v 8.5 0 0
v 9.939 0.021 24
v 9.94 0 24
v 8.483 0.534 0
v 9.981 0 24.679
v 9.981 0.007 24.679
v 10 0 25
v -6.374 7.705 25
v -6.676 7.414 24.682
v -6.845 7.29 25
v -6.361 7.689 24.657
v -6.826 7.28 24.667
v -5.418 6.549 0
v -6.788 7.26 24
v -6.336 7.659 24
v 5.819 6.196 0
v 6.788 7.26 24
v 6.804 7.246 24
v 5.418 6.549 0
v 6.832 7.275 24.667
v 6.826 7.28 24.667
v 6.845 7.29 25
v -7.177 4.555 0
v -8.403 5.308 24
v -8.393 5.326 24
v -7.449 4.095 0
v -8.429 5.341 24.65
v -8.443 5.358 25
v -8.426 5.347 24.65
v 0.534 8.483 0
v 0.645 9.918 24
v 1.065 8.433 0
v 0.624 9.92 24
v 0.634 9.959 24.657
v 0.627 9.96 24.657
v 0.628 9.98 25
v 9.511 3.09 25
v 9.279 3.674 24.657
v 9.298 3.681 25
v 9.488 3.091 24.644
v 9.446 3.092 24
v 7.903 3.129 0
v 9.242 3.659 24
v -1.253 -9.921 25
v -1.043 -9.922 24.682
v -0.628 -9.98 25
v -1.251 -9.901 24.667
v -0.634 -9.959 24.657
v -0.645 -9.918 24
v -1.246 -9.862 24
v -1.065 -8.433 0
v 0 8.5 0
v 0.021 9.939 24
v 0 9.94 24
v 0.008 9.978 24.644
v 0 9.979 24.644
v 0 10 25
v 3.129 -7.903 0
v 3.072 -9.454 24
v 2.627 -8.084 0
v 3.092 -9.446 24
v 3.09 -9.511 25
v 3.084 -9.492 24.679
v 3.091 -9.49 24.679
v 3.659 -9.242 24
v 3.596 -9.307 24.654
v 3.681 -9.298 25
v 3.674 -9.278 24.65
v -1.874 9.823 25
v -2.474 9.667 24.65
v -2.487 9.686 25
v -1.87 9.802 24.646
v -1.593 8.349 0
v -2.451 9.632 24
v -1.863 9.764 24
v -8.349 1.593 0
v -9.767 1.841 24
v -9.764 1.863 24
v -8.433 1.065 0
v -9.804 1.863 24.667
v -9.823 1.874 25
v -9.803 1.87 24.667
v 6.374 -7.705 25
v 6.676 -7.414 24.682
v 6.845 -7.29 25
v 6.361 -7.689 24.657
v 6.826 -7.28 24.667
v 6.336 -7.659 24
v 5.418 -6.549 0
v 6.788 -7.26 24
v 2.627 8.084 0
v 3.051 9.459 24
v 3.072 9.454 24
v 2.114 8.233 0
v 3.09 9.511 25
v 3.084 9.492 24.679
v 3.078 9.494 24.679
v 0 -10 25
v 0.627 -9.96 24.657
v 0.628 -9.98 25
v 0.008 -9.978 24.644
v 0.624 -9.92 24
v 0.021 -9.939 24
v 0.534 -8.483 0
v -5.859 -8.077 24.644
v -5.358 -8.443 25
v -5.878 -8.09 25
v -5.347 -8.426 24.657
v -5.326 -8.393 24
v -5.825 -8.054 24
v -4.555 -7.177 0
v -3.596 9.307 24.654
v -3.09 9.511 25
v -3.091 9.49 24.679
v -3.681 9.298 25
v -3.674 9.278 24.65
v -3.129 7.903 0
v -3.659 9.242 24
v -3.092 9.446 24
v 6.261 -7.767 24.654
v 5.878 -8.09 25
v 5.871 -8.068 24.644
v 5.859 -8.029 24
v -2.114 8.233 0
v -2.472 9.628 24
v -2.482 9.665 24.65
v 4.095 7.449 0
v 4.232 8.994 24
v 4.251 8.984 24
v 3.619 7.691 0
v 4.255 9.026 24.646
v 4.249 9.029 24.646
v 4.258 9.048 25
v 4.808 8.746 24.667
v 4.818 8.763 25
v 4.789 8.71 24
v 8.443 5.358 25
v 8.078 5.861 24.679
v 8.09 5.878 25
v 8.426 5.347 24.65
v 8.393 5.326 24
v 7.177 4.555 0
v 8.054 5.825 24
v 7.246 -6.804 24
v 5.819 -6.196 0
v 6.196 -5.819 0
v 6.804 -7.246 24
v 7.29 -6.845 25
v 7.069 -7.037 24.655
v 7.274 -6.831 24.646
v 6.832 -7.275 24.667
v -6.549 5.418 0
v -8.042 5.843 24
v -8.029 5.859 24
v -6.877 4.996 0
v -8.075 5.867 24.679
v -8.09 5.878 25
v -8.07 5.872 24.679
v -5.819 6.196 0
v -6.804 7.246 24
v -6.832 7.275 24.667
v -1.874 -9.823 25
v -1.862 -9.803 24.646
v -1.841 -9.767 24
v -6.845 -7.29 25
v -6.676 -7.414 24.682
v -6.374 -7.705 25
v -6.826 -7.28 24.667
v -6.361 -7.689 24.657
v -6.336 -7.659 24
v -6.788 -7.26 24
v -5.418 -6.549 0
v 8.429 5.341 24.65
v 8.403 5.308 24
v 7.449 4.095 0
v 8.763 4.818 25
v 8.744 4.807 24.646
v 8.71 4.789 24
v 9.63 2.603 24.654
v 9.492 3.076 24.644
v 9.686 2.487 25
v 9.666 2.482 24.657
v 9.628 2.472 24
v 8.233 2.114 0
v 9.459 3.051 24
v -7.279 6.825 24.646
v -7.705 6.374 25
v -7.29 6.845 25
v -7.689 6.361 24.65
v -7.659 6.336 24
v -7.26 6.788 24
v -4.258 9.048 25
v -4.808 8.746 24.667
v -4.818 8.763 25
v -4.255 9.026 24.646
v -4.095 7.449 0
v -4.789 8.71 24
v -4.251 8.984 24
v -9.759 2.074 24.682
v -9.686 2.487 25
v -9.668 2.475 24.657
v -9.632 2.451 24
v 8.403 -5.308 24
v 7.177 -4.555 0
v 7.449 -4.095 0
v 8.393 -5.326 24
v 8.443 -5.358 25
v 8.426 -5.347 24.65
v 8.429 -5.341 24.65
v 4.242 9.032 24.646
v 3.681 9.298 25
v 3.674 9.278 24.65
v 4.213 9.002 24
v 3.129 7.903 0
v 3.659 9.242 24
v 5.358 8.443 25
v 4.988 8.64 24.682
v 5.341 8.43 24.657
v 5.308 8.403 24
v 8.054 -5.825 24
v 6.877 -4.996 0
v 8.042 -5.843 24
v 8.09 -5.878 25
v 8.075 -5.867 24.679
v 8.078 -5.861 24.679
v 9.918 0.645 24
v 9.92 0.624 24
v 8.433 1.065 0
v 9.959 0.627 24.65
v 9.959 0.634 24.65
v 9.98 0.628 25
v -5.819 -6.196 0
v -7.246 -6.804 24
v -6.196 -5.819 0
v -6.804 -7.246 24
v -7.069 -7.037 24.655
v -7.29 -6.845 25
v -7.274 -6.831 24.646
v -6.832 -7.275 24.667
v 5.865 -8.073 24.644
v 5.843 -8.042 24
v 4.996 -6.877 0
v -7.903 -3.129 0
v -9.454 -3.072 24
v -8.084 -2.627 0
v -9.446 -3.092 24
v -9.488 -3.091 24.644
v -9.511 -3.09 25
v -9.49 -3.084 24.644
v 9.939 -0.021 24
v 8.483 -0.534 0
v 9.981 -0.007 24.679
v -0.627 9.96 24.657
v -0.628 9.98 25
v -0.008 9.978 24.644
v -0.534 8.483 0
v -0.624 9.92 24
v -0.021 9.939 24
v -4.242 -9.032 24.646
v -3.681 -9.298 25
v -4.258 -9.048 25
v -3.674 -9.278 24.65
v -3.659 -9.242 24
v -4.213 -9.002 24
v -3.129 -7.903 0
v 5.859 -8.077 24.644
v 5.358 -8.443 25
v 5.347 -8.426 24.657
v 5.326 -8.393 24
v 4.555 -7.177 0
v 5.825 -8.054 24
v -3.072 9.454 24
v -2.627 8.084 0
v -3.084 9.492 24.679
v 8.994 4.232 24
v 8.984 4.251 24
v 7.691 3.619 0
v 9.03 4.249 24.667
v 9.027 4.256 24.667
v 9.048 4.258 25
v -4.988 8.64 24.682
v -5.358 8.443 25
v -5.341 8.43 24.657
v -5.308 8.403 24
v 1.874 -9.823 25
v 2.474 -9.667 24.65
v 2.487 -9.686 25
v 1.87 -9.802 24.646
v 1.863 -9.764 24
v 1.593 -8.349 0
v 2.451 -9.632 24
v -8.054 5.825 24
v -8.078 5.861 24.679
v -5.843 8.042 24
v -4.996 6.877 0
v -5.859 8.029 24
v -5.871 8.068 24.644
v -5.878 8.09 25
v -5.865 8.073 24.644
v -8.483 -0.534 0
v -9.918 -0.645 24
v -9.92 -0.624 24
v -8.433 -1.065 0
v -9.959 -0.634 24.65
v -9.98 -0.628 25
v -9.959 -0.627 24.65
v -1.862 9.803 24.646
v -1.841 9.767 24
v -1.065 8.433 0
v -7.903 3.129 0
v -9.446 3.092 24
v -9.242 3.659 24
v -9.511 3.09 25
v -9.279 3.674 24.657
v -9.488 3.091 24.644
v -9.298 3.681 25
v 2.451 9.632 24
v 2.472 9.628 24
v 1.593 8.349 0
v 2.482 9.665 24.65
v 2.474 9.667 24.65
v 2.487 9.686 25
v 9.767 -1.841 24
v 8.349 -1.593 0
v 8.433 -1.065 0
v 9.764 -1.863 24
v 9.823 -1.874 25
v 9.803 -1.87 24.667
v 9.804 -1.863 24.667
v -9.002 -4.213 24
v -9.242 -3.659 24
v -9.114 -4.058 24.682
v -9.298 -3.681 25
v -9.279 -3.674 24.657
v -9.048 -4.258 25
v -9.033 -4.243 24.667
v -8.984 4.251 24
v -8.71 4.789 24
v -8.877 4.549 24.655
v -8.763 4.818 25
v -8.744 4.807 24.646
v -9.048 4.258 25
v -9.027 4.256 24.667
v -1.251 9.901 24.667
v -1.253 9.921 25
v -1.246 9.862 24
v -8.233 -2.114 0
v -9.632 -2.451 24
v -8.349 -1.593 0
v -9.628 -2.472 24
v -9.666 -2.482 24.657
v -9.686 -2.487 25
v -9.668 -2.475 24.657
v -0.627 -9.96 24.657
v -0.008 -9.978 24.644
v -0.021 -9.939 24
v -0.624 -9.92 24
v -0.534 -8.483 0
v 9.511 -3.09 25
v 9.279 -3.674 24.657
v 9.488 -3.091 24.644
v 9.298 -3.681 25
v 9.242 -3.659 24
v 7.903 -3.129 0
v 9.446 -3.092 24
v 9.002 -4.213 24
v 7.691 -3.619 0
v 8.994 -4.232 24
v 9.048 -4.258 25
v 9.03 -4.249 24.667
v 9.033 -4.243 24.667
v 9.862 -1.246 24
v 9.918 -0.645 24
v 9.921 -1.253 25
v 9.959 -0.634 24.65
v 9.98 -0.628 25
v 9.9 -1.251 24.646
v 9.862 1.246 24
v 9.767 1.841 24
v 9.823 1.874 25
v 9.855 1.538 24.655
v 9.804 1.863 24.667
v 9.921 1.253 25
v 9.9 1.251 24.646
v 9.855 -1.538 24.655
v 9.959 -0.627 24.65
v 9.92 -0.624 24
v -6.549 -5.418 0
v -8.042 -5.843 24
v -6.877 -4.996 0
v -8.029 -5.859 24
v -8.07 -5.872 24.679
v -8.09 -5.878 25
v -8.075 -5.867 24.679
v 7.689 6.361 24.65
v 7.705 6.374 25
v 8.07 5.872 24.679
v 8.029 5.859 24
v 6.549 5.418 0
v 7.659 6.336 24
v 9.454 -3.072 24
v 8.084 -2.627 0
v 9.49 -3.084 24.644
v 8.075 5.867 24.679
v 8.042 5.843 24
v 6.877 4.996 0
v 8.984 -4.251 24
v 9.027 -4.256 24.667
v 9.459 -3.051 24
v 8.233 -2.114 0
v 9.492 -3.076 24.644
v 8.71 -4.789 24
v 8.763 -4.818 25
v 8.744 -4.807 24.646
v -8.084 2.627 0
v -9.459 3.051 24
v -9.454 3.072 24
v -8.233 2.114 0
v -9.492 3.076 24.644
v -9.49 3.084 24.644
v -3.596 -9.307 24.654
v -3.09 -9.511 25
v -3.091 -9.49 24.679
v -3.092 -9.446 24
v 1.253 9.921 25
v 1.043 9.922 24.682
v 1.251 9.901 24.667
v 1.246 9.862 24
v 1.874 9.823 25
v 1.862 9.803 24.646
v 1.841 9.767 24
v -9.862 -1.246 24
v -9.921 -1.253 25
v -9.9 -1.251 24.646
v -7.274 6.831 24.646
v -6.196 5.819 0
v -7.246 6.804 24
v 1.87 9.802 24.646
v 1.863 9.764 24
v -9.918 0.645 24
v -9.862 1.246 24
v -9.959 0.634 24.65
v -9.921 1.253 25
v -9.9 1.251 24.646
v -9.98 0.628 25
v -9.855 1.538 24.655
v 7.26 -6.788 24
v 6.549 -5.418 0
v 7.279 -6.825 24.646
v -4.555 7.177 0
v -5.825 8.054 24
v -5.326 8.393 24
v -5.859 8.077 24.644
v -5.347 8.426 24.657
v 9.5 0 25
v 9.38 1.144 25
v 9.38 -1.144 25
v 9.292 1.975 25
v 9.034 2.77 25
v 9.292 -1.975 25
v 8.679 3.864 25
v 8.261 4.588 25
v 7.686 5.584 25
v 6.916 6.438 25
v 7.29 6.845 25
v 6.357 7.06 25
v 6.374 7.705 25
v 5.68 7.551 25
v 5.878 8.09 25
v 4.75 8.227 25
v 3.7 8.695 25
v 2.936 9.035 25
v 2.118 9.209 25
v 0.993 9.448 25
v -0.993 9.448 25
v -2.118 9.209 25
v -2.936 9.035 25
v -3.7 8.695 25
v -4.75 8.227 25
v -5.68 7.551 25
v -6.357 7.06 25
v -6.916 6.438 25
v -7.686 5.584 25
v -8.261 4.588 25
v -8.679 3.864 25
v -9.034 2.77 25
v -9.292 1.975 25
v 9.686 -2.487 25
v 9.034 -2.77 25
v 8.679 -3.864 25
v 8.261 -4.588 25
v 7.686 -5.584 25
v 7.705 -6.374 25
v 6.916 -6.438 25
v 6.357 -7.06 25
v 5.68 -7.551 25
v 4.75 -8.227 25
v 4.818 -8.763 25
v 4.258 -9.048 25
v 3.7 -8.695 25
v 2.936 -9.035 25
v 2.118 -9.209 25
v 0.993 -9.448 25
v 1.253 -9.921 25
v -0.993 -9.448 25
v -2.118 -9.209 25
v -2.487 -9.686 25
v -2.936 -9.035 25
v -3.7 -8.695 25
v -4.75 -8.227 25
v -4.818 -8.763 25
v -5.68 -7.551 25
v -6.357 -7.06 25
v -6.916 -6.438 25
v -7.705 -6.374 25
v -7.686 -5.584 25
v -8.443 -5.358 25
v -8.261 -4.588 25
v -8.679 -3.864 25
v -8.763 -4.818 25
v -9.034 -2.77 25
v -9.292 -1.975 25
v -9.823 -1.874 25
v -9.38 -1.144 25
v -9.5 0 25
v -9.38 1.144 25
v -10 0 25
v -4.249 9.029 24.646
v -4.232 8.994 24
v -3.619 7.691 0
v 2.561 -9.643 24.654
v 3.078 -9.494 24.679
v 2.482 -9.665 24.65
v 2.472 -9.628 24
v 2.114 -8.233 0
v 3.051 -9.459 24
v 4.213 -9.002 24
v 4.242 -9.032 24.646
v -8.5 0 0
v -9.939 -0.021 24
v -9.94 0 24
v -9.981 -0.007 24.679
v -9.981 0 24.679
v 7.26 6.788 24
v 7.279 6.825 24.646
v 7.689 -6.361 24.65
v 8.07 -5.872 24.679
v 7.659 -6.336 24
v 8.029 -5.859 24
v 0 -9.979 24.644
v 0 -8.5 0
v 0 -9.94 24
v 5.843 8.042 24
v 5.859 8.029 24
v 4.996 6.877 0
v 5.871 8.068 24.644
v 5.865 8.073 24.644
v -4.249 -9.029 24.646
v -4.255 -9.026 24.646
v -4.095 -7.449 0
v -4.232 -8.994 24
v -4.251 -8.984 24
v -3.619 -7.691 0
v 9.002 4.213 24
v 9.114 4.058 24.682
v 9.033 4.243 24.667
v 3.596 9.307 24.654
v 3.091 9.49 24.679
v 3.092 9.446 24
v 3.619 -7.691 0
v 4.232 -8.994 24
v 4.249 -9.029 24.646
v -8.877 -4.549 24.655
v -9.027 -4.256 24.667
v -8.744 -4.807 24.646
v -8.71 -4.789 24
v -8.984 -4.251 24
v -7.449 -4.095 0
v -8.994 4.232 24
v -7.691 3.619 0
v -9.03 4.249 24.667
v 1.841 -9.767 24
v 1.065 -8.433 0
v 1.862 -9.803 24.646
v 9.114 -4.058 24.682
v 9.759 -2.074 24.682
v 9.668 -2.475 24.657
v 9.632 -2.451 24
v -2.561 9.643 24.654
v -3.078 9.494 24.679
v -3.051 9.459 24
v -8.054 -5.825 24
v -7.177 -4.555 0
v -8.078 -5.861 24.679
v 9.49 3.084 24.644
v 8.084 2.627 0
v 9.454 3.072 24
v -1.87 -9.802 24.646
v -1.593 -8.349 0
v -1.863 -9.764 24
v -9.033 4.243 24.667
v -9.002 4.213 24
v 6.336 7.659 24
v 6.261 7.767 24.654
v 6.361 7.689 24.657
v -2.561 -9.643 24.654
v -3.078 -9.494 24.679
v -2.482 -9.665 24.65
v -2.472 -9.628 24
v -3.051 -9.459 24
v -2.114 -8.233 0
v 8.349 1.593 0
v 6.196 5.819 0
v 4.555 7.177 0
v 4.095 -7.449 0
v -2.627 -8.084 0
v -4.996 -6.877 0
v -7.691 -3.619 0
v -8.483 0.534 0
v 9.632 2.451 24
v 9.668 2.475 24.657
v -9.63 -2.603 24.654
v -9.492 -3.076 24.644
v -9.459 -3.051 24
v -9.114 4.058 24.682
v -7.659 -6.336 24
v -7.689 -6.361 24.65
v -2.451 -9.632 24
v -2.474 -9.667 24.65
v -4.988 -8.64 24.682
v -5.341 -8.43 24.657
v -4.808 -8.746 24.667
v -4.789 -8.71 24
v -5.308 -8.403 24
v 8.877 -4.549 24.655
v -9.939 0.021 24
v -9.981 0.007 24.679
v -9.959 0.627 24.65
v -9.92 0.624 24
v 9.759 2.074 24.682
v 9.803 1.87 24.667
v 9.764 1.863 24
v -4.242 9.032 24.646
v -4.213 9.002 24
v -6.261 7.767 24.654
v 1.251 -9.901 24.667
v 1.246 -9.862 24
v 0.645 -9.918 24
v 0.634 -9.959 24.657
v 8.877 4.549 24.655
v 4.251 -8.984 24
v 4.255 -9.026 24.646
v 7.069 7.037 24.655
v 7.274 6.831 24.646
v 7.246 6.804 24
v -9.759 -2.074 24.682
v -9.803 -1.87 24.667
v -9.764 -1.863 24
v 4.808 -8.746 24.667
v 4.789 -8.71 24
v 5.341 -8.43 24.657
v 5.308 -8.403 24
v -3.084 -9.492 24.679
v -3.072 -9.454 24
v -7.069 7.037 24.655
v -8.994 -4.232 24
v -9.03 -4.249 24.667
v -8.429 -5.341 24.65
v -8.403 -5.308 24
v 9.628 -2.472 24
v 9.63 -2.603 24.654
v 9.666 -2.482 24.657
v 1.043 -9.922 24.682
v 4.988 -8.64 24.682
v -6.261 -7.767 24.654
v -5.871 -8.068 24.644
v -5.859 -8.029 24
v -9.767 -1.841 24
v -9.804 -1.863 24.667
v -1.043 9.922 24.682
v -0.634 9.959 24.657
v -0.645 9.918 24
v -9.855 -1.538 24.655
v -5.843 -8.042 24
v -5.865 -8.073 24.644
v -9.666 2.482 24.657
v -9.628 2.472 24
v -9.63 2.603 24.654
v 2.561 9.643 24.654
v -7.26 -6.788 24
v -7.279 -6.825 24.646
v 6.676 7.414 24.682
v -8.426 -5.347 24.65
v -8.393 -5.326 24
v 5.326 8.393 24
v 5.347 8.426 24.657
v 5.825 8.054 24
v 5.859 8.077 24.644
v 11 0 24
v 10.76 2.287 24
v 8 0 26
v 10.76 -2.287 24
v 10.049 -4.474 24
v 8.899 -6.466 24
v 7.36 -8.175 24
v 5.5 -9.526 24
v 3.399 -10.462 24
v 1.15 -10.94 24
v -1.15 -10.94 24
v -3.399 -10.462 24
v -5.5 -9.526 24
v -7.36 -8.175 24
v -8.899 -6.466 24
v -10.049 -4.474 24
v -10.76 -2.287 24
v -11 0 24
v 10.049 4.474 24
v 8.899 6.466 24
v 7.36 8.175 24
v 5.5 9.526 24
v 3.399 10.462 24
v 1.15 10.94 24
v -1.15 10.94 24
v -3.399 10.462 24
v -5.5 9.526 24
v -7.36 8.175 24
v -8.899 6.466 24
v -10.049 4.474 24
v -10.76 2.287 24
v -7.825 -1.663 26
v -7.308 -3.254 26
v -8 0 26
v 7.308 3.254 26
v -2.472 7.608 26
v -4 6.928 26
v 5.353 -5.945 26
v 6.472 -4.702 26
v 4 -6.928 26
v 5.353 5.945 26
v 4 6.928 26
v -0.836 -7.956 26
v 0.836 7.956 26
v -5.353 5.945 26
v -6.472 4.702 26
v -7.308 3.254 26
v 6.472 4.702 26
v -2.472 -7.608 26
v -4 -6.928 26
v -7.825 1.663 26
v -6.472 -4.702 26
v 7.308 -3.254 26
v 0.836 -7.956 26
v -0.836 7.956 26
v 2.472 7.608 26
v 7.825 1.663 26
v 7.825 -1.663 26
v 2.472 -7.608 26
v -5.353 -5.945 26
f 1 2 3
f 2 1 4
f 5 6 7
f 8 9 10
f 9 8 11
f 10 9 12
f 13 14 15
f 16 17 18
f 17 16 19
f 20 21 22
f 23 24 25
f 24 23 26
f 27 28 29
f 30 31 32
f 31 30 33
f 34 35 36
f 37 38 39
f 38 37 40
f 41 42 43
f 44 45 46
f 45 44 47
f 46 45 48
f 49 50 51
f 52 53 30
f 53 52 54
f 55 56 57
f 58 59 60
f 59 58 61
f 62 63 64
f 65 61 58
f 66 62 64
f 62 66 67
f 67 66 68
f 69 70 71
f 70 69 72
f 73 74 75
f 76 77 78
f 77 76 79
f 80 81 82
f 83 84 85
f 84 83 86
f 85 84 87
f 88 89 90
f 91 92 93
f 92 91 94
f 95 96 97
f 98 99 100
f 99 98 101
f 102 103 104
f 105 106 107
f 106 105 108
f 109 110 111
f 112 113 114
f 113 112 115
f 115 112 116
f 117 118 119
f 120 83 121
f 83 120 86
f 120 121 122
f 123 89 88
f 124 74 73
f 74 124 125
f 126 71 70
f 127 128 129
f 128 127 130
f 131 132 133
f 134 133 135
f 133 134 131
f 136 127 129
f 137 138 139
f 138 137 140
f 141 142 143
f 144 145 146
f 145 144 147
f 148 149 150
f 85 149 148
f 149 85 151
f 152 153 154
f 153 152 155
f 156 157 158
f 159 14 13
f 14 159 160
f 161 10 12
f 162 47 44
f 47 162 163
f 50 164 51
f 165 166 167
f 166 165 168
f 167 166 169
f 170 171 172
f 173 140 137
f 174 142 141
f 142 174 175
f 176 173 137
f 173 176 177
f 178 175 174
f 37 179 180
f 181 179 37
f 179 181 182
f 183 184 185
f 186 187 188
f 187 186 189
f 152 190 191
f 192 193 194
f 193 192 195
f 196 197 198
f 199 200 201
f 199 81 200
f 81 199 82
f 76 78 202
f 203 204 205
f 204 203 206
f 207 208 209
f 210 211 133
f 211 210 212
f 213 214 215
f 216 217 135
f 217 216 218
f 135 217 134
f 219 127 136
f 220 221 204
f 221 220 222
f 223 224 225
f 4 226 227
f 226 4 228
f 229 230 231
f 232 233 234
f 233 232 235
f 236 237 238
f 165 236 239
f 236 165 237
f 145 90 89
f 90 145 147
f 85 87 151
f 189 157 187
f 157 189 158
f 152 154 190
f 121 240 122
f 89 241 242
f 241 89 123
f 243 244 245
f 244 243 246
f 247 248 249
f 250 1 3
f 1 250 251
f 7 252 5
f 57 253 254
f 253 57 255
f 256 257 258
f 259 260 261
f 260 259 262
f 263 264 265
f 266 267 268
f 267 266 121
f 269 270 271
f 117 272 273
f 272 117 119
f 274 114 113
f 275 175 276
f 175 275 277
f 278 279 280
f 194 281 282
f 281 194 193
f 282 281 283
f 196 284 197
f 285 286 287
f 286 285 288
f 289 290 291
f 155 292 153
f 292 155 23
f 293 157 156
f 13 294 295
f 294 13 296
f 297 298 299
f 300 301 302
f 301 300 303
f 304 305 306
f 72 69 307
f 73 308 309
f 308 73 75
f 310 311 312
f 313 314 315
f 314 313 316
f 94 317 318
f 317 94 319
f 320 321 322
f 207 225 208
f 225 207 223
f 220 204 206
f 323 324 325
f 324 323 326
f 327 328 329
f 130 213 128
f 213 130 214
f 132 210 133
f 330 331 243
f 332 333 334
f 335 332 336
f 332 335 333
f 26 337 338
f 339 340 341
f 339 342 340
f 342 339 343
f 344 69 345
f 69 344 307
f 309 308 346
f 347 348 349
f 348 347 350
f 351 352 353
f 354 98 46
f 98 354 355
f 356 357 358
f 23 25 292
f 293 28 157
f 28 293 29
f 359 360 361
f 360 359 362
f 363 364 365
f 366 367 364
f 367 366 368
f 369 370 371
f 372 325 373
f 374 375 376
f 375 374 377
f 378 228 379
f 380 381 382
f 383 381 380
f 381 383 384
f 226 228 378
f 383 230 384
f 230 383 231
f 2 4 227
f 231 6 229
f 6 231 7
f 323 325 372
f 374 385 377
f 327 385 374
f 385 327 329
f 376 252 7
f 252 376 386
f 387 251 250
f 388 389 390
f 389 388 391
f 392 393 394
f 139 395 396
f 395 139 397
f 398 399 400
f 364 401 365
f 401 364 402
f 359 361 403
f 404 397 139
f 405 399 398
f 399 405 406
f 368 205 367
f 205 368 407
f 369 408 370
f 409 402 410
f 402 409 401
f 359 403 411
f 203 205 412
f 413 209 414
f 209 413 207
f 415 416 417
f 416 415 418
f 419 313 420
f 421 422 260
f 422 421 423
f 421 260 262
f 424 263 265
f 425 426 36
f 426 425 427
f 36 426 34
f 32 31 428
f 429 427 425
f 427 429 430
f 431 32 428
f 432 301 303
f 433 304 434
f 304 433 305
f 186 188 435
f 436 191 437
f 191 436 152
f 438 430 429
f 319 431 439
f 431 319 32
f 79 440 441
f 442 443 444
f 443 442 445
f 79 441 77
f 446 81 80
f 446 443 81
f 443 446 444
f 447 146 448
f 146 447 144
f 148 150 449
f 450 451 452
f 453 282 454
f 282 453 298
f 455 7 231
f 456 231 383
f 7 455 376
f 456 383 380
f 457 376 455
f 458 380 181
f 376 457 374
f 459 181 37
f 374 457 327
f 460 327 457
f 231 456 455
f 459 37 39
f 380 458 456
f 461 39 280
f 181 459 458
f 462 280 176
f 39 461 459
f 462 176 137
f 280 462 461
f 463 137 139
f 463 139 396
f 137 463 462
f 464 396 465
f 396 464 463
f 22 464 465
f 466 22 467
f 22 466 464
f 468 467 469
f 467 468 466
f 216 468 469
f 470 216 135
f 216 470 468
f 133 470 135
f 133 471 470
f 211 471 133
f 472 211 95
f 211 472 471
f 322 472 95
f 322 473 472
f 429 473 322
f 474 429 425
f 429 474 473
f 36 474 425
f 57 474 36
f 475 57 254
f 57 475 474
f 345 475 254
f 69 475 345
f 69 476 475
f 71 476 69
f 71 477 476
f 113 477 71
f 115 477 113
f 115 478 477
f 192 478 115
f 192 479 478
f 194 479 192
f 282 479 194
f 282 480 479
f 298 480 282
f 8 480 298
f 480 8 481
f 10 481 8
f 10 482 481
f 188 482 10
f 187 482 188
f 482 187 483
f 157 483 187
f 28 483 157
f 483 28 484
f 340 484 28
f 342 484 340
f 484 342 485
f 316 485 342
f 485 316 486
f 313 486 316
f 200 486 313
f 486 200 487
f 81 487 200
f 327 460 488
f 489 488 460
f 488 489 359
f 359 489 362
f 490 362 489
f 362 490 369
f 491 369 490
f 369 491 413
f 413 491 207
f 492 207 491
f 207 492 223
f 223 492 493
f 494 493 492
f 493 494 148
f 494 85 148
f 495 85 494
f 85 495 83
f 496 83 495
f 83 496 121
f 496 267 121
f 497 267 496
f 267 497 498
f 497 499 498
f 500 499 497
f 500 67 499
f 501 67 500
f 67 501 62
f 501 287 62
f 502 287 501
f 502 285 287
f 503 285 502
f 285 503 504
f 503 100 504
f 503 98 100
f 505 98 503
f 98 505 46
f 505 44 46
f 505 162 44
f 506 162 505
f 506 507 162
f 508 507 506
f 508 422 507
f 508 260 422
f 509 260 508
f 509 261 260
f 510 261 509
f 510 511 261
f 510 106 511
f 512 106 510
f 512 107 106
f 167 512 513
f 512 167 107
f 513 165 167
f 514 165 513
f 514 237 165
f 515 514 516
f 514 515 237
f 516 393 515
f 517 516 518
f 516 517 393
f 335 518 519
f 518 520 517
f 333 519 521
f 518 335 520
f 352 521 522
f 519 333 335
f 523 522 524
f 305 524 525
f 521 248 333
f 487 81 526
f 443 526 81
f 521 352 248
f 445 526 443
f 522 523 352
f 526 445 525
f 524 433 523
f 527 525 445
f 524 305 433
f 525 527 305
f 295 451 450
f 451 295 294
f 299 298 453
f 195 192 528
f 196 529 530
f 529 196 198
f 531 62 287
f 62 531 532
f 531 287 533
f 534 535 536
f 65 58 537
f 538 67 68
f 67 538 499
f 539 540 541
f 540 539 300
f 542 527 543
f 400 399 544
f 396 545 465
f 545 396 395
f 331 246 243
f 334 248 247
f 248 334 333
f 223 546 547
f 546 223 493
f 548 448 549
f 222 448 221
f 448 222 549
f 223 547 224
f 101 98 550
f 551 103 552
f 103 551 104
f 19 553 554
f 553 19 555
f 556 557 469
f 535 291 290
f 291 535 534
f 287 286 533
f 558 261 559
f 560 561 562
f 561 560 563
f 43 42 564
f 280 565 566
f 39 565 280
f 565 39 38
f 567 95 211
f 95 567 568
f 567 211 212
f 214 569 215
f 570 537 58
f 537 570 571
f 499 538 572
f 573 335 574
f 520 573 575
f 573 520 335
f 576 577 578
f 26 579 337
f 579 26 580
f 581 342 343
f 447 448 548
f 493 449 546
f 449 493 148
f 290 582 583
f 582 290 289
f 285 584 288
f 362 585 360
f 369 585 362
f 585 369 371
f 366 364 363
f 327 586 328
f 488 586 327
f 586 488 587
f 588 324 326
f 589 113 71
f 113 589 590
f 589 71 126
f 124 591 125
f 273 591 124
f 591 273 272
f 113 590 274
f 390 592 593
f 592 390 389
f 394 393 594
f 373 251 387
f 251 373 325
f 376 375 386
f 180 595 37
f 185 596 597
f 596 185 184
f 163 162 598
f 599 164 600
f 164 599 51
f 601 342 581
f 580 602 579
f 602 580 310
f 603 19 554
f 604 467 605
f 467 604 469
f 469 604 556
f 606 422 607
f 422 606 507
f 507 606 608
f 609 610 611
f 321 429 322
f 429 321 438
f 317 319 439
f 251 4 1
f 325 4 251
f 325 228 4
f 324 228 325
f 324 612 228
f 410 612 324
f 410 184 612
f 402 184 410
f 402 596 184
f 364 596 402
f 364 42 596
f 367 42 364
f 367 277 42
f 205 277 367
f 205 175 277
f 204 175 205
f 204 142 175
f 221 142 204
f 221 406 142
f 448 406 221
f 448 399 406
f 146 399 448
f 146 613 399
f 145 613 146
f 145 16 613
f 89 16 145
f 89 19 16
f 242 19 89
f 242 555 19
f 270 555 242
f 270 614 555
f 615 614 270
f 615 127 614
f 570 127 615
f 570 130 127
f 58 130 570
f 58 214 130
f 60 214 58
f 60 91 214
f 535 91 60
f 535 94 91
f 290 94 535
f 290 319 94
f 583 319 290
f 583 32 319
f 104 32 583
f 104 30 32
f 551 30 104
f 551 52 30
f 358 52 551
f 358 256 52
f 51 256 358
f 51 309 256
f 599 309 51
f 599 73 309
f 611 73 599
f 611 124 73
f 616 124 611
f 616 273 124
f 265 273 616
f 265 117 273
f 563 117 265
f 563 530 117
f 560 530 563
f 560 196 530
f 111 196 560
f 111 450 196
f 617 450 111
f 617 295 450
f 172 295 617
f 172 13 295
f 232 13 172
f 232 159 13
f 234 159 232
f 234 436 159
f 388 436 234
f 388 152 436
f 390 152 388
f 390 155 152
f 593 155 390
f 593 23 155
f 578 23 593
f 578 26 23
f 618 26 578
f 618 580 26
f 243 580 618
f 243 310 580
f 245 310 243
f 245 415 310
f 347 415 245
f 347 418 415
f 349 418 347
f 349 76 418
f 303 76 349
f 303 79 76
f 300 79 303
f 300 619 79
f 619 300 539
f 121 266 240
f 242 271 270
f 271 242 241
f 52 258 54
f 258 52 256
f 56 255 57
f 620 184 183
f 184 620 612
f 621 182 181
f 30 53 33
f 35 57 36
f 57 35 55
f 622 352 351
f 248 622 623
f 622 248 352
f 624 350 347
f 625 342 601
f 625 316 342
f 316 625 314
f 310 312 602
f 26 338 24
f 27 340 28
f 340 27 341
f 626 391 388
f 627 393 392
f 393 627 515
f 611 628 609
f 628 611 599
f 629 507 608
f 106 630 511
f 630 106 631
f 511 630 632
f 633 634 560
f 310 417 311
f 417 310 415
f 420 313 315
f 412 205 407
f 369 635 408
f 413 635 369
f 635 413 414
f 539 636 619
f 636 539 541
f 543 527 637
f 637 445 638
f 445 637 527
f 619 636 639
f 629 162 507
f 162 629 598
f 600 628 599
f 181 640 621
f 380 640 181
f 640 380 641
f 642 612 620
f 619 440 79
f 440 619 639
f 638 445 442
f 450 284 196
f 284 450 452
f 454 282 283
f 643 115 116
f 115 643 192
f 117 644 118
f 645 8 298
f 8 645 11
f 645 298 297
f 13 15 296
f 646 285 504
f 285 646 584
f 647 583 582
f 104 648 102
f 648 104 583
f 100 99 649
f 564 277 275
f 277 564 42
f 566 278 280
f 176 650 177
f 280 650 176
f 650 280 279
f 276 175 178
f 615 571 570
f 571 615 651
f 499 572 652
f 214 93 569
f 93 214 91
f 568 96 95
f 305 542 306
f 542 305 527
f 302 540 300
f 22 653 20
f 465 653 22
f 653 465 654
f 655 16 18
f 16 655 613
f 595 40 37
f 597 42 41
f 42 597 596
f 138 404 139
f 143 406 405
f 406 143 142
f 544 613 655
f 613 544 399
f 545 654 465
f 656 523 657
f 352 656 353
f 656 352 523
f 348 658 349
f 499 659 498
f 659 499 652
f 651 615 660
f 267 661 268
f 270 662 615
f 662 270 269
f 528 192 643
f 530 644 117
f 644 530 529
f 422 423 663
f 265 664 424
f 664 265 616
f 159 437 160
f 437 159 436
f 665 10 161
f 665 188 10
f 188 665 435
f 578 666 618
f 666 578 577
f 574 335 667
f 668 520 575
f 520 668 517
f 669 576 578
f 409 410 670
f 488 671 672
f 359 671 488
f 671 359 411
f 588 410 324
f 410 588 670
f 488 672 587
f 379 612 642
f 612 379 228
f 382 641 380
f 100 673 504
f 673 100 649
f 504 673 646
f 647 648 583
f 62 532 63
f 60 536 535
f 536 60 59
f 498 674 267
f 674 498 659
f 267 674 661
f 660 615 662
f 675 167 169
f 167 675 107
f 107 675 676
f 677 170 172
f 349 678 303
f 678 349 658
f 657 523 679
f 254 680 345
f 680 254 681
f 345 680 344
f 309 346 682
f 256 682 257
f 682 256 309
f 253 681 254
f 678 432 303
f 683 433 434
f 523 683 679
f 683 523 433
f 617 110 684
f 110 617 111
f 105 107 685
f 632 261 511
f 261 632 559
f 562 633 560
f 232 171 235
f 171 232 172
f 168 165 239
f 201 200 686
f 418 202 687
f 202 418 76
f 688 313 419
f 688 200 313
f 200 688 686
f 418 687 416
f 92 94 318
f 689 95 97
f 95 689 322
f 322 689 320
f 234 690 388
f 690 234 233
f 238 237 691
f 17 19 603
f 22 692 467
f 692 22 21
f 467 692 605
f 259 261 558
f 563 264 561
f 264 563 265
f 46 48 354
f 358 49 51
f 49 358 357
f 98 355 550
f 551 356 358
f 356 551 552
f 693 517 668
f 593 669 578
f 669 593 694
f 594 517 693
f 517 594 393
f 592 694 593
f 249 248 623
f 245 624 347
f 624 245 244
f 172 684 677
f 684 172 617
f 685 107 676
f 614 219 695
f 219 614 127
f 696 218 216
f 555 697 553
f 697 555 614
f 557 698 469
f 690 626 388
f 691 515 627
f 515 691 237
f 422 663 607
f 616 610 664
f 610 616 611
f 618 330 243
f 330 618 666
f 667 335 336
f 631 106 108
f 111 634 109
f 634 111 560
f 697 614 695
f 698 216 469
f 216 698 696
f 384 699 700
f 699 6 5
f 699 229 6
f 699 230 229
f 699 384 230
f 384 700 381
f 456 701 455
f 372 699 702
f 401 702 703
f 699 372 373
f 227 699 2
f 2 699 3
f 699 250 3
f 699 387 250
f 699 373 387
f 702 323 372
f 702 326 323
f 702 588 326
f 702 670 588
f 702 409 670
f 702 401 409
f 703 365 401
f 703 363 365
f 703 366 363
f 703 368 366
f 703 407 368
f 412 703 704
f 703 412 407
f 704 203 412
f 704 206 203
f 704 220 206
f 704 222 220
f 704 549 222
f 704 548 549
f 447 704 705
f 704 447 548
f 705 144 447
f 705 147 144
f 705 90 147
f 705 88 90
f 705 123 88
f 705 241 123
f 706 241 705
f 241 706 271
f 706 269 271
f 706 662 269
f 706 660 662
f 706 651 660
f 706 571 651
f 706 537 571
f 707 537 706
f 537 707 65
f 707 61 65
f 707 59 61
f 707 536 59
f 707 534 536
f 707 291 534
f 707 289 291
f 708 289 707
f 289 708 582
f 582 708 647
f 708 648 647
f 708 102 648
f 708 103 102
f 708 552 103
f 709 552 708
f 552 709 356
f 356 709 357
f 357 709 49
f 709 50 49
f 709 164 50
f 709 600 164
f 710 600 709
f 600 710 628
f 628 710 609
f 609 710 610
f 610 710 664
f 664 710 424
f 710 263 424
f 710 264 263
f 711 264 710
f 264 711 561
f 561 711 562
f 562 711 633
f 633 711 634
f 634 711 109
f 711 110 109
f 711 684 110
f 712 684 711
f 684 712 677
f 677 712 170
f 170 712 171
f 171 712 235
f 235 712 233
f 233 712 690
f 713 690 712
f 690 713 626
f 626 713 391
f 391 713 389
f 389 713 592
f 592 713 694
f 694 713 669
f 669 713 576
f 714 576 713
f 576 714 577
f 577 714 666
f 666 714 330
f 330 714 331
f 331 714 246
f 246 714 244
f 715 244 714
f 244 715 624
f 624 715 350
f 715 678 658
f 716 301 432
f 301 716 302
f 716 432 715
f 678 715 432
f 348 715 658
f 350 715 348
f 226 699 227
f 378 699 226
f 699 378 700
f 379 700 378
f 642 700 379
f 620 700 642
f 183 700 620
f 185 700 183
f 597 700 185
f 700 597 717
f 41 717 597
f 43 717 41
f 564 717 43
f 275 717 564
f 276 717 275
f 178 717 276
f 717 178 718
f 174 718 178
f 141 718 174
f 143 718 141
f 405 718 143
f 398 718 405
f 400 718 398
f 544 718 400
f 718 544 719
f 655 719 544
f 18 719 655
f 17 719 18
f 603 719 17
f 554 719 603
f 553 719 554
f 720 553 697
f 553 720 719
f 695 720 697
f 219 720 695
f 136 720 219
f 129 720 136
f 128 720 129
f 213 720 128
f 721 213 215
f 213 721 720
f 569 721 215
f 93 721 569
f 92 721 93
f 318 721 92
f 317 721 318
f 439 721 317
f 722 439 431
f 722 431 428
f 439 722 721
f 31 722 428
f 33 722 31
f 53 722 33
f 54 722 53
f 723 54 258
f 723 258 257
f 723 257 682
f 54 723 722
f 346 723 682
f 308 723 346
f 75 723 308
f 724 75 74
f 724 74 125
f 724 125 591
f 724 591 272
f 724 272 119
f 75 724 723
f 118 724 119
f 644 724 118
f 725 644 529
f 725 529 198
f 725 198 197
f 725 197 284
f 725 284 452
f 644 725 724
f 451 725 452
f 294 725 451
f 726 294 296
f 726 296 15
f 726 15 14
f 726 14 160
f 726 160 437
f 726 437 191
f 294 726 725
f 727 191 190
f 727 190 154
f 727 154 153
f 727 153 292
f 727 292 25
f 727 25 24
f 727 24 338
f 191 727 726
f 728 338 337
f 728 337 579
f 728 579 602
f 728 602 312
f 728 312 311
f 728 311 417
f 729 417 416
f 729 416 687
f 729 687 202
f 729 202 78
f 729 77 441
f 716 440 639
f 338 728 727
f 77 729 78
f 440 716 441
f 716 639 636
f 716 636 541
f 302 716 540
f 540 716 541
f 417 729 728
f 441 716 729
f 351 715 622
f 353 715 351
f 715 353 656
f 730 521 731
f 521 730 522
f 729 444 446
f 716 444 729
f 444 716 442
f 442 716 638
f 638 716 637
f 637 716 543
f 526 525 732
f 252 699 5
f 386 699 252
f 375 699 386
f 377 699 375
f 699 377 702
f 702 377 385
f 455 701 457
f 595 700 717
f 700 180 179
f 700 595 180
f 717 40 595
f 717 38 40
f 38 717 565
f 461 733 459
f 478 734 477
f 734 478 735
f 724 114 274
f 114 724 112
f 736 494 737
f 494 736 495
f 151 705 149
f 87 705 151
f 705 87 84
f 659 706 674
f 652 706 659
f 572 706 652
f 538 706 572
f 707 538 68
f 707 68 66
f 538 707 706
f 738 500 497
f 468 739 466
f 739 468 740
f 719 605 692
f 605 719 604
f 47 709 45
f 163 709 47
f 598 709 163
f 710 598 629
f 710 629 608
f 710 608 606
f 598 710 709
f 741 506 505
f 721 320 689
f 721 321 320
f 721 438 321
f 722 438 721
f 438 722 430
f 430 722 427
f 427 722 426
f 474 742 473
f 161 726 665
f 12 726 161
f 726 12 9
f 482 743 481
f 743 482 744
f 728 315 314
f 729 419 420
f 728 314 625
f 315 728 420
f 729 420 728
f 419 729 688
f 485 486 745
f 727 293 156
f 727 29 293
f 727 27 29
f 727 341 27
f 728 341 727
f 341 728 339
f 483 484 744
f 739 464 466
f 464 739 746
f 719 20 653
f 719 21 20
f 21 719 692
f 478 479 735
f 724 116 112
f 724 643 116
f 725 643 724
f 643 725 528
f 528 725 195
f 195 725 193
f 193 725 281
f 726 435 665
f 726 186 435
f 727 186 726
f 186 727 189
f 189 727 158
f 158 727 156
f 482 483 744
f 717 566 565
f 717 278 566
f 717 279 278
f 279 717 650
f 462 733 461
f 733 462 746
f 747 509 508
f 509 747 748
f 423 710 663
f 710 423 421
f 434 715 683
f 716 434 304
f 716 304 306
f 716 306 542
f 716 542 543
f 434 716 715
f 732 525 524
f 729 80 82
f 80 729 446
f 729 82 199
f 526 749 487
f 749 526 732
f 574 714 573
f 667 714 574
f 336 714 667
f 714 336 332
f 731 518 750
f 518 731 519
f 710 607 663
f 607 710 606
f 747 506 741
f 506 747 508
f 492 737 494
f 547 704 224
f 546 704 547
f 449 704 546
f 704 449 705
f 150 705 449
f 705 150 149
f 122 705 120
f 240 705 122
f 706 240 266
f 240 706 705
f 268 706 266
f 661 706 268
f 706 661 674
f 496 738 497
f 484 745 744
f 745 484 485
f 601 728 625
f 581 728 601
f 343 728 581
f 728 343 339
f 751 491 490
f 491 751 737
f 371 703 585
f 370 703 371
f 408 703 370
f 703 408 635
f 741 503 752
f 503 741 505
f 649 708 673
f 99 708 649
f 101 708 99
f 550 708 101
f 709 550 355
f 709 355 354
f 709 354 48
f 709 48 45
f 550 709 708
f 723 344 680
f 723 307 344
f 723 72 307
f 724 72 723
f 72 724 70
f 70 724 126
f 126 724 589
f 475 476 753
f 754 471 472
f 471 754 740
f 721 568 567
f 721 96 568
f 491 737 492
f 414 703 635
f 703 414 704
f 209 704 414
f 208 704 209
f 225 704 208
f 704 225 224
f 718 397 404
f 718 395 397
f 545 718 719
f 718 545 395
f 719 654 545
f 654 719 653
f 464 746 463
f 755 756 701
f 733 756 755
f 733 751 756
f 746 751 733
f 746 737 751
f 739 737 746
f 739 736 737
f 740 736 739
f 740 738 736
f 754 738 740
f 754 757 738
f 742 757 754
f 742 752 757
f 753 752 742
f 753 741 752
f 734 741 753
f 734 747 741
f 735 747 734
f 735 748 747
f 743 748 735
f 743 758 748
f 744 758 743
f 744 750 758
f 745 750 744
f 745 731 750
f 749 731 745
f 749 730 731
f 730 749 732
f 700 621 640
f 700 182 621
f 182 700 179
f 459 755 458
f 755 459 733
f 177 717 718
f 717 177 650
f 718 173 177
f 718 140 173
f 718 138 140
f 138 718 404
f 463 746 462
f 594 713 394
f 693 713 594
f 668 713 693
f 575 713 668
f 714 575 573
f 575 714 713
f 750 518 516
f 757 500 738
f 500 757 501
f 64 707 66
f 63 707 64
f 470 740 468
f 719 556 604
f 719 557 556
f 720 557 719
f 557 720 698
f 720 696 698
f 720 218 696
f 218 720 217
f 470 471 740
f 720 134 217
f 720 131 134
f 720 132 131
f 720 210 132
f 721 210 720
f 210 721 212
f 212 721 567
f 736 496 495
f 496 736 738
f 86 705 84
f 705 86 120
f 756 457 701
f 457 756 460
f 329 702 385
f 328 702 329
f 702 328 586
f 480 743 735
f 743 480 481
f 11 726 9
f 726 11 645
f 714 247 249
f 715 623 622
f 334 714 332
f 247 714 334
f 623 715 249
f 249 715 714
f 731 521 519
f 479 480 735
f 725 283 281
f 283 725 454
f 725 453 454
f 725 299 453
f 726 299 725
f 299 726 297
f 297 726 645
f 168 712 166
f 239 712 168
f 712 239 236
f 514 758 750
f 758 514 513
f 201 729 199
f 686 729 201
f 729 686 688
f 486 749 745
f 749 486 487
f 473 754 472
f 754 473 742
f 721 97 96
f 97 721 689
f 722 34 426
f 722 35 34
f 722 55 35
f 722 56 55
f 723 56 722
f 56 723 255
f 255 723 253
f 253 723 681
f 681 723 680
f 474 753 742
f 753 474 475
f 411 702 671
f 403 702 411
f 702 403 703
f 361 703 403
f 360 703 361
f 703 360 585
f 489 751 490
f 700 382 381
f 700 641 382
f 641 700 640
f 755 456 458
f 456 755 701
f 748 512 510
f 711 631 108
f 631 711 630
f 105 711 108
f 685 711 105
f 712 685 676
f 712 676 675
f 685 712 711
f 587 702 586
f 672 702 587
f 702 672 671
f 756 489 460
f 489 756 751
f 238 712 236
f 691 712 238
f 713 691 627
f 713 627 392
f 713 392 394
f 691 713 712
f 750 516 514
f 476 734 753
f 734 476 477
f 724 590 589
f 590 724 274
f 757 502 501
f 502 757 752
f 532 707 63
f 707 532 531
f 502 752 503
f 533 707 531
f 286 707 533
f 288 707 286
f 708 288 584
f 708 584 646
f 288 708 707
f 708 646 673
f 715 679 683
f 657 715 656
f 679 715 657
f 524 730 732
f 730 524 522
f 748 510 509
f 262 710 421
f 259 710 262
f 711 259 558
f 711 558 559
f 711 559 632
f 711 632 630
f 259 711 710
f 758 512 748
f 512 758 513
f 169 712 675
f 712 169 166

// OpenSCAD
module coffee_cup()
{
	//cup
	radius_top = 10;
	radius_bottom = 8.5;
	hight = 25;
	cylinder(h=hight,r1=radius_bottom,r2=radius_top,$fn=100);
	
	//Top
	radius_top_lid = 11;
	radius_bottom_lid = 8;
	hight_lid = 2;
	translate([0,0,hight-1])
		cylinder(h=hight_lid,r1=radius_top_lid,r2=radius_bottom_lid);
}


coffee_cup();
